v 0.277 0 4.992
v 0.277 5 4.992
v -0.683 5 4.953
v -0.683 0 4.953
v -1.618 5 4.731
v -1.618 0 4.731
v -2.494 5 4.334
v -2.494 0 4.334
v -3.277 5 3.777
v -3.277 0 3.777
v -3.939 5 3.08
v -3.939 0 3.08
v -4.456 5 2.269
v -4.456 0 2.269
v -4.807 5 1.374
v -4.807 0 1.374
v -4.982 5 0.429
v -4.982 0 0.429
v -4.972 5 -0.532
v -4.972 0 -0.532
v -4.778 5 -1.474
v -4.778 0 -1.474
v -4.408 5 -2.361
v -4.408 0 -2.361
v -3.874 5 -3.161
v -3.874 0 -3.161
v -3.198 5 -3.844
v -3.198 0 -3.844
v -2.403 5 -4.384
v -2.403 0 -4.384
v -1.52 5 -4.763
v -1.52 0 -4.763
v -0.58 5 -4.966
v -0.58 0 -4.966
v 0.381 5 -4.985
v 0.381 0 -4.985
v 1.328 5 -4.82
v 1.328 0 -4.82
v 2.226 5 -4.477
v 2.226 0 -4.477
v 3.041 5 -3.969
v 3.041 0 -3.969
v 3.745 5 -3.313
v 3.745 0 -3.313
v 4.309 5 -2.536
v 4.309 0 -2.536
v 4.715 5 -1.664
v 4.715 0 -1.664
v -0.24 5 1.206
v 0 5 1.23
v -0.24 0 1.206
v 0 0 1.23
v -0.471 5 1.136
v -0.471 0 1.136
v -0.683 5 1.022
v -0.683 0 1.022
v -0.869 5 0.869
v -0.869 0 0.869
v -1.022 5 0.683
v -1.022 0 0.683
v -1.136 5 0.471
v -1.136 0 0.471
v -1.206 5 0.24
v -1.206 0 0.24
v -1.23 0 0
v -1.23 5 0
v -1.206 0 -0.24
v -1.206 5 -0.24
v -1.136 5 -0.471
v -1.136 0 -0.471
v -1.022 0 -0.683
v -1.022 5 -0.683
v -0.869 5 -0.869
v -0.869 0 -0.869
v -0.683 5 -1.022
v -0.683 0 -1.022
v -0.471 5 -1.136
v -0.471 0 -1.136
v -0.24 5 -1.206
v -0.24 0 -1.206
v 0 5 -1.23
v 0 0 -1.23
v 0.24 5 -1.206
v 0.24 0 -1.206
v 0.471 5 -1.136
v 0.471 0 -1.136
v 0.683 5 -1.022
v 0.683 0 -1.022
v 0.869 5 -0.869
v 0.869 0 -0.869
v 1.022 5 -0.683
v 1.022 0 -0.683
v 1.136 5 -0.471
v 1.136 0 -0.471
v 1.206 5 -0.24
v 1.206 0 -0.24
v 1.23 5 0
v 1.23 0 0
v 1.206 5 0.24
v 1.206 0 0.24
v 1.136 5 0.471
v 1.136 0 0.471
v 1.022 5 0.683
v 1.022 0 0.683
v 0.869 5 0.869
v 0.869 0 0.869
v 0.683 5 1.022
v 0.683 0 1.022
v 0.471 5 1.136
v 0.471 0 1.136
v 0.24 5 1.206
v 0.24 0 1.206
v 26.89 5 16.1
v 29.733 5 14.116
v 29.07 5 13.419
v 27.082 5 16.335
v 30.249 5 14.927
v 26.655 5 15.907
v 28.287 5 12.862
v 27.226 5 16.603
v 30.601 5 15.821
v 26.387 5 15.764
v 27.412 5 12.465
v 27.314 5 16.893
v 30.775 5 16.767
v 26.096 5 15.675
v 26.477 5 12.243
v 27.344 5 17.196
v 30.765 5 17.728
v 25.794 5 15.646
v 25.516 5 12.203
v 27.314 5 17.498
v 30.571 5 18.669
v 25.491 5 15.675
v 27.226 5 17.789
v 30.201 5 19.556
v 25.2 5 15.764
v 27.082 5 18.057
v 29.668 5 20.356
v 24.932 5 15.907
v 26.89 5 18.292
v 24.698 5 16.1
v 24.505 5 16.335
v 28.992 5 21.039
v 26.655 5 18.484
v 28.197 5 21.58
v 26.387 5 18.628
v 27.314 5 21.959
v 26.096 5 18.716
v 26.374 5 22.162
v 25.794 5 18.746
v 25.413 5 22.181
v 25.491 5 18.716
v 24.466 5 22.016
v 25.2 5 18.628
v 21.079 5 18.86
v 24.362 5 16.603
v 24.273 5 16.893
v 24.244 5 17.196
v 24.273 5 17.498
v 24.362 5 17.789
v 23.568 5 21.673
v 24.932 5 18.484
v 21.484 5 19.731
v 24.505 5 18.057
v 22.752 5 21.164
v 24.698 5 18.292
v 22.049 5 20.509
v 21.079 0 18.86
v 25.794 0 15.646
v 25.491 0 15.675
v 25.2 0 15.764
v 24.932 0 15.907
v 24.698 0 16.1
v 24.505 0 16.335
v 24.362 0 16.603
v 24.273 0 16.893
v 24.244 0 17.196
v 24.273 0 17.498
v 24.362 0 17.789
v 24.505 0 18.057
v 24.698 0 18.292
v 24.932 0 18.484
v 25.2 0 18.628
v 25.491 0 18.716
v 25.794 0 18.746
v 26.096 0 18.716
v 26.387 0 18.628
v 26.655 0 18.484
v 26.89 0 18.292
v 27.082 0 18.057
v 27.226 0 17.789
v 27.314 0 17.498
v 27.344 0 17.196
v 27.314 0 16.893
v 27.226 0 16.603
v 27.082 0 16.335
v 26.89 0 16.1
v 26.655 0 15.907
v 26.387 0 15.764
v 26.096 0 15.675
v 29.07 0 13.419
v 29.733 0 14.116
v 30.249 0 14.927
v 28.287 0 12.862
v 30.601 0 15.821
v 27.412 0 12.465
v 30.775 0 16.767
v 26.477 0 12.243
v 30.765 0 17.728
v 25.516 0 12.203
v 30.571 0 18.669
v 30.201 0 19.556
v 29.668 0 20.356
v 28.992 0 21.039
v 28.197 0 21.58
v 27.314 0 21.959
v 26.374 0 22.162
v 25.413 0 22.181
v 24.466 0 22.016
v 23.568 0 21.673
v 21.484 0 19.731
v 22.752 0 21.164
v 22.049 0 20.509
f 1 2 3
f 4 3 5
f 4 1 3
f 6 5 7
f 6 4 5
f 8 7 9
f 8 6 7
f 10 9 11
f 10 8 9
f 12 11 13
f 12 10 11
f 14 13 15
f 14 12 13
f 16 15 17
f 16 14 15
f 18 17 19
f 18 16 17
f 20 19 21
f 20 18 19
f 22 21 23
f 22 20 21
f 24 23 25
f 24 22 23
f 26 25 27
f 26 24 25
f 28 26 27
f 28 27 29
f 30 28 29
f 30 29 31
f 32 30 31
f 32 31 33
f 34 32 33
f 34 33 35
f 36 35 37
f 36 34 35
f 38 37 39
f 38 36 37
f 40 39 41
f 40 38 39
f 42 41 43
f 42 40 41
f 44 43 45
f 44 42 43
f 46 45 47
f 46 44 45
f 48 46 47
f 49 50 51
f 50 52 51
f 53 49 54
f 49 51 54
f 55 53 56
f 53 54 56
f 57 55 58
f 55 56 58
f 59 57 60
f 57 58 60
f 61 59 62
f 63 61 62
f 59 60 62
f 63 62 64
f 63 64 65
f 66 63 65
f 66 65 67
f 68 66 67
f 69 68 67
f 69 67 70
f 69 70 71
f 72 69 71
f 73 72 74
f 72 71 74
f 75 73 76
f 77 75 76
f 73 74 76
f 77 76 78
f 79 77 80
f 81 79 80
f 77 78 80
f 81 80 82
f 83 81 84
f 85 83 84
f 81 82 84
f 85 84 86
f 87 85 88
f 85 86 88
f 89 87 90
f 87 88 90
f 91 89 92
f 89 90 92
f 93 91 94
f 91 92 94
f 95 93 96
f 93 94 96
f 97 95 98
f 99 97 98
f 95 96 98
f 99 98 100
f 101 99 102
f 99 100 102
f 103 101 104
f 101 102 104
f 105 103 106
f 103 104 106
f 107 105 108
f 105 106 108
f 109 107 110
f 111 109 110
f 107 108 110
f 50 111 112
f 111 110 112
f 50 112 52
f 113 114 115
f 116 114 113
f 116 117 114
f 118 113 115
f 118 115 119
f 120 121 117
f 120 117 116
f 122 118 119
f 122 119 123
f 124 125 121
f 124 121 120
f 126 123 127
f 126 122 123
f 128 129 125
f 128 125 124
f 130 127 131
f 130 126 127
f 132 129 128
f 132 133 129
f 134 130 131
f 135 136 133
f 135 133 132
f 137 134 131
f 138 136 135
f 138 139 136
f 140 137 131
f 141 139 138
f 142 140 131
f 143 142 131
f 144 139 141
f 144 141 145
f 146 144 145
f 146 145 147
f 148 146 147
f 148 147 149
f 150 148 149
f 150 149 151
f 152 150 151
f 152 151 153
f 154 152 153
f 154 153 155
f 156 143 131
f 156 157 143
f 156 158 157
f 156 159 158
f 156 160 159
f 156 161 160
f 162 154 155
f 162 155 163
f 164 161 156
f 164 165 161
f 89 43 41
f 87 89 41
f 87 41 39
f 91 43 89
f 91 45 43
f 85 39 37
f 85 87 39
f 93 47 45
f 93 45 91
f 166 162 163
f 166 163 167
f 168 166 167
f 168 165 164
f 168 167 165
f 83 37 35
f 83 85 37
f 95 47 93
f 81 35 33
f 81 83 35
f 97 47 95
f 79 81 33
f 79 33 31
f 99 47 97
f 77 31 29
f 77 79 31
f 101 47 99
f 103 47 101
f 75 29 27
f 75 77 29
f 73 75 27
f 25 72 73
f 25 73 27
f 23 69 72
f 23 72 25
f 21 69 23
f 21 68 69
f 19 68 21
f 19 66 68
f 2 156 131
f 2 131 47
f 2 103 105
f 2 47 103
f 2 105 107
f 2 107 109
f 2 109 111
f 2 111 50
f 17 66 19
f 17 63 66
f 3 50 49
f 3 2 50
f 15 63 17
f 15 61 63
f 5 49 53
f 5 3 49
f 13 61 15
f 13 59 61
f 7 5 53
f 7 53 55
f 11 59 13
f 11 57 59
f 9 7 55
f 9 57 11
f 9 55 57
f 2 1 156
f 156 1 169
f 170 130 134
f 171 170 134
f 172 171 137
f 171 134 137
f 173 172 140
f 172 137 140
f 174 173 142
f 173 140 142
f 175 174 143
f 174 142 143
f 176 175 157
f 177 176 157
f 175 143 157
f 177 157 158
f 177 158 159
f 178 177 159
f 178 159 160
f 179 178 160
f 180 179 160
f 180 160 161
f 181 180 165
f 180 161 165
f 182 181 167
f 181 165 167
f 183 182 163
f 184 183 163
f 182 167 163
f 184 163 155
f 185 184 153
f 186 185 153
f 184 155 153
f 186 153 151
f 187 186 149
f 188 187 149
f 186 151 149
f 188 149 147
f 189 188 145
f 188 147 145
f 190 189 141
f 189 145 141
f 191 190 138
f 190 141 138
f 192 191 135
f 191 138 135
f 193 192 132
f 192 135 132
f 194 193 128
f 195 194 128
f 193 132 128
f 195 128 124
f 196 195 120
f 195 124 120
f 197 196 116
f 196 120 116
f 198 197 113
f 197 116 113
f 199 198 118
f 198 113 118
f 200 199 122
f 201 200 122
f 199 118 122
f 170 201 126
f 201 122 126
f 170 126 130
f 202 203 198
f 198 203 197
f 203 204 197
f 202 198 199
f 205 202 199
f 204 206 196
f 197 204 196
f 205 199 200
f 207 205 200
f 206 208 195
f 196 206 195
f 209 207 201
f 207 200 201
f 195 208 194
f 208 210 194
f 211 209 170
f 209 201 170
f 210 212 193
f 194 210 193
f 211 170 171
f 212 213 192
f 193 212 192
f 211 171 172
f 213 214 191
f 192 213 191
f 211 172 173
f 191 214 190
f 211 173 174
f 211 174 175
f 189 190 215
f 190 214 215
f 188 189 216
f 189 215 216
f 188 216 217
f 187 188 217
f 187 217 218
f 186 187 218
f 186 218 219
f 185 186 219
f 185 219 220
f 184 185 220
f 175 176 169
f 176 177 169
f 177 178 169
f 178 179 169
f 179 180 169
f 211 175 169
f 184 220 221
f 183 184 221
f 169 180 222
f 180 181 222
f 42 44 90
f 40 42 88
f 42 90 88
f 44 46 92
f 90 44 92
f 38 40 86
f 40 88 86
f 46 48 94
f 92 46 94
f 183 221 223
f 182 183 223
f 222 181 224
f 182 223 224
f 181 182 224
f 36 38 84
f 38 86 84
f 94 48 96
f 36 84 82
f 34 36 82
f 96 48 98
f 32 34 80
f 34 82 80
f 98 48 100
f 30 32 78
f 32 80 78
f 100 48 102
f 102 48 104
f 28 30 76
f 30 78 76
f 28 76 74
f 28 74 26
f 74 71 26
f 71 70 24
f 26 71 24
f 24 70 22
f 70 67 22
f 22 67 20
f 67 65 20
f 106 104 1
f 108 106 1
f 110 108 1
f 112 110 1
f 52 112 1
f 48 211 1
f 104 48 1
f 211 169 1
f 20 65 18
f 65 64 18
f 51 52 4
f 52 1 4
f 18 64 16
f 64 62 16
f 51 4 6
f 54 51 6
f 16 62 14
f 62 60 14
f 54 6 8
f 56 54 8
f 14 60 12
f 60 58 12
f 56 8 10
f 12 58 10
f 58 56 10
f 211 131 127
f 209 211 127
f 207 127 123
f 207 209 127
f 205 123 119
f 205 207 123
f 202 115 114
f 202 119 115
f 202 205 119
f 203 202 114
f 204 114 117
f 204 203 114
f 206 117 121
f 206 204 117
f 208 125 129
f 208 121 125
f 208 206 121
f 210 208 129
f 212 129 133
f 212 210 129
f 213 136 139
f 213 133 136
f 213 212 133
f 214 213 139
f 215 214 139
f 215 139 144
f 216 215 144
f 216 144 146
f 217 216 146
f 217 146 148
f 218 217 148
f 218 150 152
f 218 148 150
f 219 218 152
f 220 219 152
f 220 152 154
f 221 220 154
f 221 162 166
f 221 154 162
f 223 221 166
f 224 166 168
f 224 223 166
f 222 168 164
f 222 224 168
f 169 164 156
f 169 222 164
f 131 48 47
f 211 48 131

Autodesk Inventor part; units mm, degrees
ref_plane "YZ Plane" through (0, 0, 0) normal (1, 0, 0) x (0, 1, 0)
ref_plane "XZ Plane" through (0, 0, 0) normal (0, 1, 0) x (-1, 0, 0)
sketch "Sketch1" plane through (0, 0, 0) normal (0, 1, 0) x (-1, 0, 0)
  circle A0 centre (0, 0) radius 5
  circle A1 centre (-25.7936, 17.1957) radius 5
  line L0 (-4.715, -1.6641) -> (-25.5162, 12.2034)
  line L1 (-0.2774, 4.9923) -> (-21.0786, 18.8598)
  line L2 (0, 0) -> (-25.7936, 0) construction
  line L3 (-25.7936, 0) -> (-25.7936, 17.1957) construction
  line L4 (0, 0) -> (-25.7936, 17.1957) construction
  dimension "d0" = 10
  dimension "d1" = 10
  dimension "d2" = 4
  dimension "d3" = 4
  dimension "d27" = 25
  dimension "d28" = 33.69
extrude "Extrusion1" add sketch "Sketch1" along normal blind 5
sketch "Sketch2" plane through (0, 0, 0) normal (0, -1, 0) x (1, 0, 0)
  line L0 (0, 0) -> (25.7936, 17.1957) construction
  arc A0 (25.5162, 12.2034) -> (21.0786, 18.8598) centre (25.7936, 17.1957) ccw projected
  line L1 (0.2774, 4.9923) -> (21.0786, 18.8598) projected
  arc A1 (0.2774, 4.9923) -> (4.715, -1.6641) centre (0, 0) ccw projected
  line L2 (25.5162, 12.2034) -> (4.715, -1.6641) projected
hole "Hole1" at (25.7936, 0, 17.1957) direction (0, 1, 0) diameter 3.1 end through all
ref_plane "Work Plane1" through (0, 1.5, 0) normal (0, 1, 0) x (1, 0, 0)
sketch "Sketch4" plane through (0, 5, 0) normal (0, 1, 0) x (1, 0, 0)
  circle A0 centre (25.7936, -17.1957) radius 1.55 projected
  arc A1 (21.0786, -18.8598) -> (25.5162, -12.2034) centre (25.7936, -17.1957) ccw projected
  line L0 (25.5162, -12.2034) -> (4.715, 1.6641) projected
  arc A2 (4.715, 1.6641) -> (0.2774, -4.9923) centre (0, 0) ccw projected
  line L1 (0.2774, -4.9923) -> (21.0786, -18.8598) projected
hole "Hole2" at (0, 5, 0) direction (0, -1, 0) diameter 2.459 end through all thread size "M3x0.5" class "6H" standard "ISO Metric profile"
properties part number "gripper_hand_connector"
